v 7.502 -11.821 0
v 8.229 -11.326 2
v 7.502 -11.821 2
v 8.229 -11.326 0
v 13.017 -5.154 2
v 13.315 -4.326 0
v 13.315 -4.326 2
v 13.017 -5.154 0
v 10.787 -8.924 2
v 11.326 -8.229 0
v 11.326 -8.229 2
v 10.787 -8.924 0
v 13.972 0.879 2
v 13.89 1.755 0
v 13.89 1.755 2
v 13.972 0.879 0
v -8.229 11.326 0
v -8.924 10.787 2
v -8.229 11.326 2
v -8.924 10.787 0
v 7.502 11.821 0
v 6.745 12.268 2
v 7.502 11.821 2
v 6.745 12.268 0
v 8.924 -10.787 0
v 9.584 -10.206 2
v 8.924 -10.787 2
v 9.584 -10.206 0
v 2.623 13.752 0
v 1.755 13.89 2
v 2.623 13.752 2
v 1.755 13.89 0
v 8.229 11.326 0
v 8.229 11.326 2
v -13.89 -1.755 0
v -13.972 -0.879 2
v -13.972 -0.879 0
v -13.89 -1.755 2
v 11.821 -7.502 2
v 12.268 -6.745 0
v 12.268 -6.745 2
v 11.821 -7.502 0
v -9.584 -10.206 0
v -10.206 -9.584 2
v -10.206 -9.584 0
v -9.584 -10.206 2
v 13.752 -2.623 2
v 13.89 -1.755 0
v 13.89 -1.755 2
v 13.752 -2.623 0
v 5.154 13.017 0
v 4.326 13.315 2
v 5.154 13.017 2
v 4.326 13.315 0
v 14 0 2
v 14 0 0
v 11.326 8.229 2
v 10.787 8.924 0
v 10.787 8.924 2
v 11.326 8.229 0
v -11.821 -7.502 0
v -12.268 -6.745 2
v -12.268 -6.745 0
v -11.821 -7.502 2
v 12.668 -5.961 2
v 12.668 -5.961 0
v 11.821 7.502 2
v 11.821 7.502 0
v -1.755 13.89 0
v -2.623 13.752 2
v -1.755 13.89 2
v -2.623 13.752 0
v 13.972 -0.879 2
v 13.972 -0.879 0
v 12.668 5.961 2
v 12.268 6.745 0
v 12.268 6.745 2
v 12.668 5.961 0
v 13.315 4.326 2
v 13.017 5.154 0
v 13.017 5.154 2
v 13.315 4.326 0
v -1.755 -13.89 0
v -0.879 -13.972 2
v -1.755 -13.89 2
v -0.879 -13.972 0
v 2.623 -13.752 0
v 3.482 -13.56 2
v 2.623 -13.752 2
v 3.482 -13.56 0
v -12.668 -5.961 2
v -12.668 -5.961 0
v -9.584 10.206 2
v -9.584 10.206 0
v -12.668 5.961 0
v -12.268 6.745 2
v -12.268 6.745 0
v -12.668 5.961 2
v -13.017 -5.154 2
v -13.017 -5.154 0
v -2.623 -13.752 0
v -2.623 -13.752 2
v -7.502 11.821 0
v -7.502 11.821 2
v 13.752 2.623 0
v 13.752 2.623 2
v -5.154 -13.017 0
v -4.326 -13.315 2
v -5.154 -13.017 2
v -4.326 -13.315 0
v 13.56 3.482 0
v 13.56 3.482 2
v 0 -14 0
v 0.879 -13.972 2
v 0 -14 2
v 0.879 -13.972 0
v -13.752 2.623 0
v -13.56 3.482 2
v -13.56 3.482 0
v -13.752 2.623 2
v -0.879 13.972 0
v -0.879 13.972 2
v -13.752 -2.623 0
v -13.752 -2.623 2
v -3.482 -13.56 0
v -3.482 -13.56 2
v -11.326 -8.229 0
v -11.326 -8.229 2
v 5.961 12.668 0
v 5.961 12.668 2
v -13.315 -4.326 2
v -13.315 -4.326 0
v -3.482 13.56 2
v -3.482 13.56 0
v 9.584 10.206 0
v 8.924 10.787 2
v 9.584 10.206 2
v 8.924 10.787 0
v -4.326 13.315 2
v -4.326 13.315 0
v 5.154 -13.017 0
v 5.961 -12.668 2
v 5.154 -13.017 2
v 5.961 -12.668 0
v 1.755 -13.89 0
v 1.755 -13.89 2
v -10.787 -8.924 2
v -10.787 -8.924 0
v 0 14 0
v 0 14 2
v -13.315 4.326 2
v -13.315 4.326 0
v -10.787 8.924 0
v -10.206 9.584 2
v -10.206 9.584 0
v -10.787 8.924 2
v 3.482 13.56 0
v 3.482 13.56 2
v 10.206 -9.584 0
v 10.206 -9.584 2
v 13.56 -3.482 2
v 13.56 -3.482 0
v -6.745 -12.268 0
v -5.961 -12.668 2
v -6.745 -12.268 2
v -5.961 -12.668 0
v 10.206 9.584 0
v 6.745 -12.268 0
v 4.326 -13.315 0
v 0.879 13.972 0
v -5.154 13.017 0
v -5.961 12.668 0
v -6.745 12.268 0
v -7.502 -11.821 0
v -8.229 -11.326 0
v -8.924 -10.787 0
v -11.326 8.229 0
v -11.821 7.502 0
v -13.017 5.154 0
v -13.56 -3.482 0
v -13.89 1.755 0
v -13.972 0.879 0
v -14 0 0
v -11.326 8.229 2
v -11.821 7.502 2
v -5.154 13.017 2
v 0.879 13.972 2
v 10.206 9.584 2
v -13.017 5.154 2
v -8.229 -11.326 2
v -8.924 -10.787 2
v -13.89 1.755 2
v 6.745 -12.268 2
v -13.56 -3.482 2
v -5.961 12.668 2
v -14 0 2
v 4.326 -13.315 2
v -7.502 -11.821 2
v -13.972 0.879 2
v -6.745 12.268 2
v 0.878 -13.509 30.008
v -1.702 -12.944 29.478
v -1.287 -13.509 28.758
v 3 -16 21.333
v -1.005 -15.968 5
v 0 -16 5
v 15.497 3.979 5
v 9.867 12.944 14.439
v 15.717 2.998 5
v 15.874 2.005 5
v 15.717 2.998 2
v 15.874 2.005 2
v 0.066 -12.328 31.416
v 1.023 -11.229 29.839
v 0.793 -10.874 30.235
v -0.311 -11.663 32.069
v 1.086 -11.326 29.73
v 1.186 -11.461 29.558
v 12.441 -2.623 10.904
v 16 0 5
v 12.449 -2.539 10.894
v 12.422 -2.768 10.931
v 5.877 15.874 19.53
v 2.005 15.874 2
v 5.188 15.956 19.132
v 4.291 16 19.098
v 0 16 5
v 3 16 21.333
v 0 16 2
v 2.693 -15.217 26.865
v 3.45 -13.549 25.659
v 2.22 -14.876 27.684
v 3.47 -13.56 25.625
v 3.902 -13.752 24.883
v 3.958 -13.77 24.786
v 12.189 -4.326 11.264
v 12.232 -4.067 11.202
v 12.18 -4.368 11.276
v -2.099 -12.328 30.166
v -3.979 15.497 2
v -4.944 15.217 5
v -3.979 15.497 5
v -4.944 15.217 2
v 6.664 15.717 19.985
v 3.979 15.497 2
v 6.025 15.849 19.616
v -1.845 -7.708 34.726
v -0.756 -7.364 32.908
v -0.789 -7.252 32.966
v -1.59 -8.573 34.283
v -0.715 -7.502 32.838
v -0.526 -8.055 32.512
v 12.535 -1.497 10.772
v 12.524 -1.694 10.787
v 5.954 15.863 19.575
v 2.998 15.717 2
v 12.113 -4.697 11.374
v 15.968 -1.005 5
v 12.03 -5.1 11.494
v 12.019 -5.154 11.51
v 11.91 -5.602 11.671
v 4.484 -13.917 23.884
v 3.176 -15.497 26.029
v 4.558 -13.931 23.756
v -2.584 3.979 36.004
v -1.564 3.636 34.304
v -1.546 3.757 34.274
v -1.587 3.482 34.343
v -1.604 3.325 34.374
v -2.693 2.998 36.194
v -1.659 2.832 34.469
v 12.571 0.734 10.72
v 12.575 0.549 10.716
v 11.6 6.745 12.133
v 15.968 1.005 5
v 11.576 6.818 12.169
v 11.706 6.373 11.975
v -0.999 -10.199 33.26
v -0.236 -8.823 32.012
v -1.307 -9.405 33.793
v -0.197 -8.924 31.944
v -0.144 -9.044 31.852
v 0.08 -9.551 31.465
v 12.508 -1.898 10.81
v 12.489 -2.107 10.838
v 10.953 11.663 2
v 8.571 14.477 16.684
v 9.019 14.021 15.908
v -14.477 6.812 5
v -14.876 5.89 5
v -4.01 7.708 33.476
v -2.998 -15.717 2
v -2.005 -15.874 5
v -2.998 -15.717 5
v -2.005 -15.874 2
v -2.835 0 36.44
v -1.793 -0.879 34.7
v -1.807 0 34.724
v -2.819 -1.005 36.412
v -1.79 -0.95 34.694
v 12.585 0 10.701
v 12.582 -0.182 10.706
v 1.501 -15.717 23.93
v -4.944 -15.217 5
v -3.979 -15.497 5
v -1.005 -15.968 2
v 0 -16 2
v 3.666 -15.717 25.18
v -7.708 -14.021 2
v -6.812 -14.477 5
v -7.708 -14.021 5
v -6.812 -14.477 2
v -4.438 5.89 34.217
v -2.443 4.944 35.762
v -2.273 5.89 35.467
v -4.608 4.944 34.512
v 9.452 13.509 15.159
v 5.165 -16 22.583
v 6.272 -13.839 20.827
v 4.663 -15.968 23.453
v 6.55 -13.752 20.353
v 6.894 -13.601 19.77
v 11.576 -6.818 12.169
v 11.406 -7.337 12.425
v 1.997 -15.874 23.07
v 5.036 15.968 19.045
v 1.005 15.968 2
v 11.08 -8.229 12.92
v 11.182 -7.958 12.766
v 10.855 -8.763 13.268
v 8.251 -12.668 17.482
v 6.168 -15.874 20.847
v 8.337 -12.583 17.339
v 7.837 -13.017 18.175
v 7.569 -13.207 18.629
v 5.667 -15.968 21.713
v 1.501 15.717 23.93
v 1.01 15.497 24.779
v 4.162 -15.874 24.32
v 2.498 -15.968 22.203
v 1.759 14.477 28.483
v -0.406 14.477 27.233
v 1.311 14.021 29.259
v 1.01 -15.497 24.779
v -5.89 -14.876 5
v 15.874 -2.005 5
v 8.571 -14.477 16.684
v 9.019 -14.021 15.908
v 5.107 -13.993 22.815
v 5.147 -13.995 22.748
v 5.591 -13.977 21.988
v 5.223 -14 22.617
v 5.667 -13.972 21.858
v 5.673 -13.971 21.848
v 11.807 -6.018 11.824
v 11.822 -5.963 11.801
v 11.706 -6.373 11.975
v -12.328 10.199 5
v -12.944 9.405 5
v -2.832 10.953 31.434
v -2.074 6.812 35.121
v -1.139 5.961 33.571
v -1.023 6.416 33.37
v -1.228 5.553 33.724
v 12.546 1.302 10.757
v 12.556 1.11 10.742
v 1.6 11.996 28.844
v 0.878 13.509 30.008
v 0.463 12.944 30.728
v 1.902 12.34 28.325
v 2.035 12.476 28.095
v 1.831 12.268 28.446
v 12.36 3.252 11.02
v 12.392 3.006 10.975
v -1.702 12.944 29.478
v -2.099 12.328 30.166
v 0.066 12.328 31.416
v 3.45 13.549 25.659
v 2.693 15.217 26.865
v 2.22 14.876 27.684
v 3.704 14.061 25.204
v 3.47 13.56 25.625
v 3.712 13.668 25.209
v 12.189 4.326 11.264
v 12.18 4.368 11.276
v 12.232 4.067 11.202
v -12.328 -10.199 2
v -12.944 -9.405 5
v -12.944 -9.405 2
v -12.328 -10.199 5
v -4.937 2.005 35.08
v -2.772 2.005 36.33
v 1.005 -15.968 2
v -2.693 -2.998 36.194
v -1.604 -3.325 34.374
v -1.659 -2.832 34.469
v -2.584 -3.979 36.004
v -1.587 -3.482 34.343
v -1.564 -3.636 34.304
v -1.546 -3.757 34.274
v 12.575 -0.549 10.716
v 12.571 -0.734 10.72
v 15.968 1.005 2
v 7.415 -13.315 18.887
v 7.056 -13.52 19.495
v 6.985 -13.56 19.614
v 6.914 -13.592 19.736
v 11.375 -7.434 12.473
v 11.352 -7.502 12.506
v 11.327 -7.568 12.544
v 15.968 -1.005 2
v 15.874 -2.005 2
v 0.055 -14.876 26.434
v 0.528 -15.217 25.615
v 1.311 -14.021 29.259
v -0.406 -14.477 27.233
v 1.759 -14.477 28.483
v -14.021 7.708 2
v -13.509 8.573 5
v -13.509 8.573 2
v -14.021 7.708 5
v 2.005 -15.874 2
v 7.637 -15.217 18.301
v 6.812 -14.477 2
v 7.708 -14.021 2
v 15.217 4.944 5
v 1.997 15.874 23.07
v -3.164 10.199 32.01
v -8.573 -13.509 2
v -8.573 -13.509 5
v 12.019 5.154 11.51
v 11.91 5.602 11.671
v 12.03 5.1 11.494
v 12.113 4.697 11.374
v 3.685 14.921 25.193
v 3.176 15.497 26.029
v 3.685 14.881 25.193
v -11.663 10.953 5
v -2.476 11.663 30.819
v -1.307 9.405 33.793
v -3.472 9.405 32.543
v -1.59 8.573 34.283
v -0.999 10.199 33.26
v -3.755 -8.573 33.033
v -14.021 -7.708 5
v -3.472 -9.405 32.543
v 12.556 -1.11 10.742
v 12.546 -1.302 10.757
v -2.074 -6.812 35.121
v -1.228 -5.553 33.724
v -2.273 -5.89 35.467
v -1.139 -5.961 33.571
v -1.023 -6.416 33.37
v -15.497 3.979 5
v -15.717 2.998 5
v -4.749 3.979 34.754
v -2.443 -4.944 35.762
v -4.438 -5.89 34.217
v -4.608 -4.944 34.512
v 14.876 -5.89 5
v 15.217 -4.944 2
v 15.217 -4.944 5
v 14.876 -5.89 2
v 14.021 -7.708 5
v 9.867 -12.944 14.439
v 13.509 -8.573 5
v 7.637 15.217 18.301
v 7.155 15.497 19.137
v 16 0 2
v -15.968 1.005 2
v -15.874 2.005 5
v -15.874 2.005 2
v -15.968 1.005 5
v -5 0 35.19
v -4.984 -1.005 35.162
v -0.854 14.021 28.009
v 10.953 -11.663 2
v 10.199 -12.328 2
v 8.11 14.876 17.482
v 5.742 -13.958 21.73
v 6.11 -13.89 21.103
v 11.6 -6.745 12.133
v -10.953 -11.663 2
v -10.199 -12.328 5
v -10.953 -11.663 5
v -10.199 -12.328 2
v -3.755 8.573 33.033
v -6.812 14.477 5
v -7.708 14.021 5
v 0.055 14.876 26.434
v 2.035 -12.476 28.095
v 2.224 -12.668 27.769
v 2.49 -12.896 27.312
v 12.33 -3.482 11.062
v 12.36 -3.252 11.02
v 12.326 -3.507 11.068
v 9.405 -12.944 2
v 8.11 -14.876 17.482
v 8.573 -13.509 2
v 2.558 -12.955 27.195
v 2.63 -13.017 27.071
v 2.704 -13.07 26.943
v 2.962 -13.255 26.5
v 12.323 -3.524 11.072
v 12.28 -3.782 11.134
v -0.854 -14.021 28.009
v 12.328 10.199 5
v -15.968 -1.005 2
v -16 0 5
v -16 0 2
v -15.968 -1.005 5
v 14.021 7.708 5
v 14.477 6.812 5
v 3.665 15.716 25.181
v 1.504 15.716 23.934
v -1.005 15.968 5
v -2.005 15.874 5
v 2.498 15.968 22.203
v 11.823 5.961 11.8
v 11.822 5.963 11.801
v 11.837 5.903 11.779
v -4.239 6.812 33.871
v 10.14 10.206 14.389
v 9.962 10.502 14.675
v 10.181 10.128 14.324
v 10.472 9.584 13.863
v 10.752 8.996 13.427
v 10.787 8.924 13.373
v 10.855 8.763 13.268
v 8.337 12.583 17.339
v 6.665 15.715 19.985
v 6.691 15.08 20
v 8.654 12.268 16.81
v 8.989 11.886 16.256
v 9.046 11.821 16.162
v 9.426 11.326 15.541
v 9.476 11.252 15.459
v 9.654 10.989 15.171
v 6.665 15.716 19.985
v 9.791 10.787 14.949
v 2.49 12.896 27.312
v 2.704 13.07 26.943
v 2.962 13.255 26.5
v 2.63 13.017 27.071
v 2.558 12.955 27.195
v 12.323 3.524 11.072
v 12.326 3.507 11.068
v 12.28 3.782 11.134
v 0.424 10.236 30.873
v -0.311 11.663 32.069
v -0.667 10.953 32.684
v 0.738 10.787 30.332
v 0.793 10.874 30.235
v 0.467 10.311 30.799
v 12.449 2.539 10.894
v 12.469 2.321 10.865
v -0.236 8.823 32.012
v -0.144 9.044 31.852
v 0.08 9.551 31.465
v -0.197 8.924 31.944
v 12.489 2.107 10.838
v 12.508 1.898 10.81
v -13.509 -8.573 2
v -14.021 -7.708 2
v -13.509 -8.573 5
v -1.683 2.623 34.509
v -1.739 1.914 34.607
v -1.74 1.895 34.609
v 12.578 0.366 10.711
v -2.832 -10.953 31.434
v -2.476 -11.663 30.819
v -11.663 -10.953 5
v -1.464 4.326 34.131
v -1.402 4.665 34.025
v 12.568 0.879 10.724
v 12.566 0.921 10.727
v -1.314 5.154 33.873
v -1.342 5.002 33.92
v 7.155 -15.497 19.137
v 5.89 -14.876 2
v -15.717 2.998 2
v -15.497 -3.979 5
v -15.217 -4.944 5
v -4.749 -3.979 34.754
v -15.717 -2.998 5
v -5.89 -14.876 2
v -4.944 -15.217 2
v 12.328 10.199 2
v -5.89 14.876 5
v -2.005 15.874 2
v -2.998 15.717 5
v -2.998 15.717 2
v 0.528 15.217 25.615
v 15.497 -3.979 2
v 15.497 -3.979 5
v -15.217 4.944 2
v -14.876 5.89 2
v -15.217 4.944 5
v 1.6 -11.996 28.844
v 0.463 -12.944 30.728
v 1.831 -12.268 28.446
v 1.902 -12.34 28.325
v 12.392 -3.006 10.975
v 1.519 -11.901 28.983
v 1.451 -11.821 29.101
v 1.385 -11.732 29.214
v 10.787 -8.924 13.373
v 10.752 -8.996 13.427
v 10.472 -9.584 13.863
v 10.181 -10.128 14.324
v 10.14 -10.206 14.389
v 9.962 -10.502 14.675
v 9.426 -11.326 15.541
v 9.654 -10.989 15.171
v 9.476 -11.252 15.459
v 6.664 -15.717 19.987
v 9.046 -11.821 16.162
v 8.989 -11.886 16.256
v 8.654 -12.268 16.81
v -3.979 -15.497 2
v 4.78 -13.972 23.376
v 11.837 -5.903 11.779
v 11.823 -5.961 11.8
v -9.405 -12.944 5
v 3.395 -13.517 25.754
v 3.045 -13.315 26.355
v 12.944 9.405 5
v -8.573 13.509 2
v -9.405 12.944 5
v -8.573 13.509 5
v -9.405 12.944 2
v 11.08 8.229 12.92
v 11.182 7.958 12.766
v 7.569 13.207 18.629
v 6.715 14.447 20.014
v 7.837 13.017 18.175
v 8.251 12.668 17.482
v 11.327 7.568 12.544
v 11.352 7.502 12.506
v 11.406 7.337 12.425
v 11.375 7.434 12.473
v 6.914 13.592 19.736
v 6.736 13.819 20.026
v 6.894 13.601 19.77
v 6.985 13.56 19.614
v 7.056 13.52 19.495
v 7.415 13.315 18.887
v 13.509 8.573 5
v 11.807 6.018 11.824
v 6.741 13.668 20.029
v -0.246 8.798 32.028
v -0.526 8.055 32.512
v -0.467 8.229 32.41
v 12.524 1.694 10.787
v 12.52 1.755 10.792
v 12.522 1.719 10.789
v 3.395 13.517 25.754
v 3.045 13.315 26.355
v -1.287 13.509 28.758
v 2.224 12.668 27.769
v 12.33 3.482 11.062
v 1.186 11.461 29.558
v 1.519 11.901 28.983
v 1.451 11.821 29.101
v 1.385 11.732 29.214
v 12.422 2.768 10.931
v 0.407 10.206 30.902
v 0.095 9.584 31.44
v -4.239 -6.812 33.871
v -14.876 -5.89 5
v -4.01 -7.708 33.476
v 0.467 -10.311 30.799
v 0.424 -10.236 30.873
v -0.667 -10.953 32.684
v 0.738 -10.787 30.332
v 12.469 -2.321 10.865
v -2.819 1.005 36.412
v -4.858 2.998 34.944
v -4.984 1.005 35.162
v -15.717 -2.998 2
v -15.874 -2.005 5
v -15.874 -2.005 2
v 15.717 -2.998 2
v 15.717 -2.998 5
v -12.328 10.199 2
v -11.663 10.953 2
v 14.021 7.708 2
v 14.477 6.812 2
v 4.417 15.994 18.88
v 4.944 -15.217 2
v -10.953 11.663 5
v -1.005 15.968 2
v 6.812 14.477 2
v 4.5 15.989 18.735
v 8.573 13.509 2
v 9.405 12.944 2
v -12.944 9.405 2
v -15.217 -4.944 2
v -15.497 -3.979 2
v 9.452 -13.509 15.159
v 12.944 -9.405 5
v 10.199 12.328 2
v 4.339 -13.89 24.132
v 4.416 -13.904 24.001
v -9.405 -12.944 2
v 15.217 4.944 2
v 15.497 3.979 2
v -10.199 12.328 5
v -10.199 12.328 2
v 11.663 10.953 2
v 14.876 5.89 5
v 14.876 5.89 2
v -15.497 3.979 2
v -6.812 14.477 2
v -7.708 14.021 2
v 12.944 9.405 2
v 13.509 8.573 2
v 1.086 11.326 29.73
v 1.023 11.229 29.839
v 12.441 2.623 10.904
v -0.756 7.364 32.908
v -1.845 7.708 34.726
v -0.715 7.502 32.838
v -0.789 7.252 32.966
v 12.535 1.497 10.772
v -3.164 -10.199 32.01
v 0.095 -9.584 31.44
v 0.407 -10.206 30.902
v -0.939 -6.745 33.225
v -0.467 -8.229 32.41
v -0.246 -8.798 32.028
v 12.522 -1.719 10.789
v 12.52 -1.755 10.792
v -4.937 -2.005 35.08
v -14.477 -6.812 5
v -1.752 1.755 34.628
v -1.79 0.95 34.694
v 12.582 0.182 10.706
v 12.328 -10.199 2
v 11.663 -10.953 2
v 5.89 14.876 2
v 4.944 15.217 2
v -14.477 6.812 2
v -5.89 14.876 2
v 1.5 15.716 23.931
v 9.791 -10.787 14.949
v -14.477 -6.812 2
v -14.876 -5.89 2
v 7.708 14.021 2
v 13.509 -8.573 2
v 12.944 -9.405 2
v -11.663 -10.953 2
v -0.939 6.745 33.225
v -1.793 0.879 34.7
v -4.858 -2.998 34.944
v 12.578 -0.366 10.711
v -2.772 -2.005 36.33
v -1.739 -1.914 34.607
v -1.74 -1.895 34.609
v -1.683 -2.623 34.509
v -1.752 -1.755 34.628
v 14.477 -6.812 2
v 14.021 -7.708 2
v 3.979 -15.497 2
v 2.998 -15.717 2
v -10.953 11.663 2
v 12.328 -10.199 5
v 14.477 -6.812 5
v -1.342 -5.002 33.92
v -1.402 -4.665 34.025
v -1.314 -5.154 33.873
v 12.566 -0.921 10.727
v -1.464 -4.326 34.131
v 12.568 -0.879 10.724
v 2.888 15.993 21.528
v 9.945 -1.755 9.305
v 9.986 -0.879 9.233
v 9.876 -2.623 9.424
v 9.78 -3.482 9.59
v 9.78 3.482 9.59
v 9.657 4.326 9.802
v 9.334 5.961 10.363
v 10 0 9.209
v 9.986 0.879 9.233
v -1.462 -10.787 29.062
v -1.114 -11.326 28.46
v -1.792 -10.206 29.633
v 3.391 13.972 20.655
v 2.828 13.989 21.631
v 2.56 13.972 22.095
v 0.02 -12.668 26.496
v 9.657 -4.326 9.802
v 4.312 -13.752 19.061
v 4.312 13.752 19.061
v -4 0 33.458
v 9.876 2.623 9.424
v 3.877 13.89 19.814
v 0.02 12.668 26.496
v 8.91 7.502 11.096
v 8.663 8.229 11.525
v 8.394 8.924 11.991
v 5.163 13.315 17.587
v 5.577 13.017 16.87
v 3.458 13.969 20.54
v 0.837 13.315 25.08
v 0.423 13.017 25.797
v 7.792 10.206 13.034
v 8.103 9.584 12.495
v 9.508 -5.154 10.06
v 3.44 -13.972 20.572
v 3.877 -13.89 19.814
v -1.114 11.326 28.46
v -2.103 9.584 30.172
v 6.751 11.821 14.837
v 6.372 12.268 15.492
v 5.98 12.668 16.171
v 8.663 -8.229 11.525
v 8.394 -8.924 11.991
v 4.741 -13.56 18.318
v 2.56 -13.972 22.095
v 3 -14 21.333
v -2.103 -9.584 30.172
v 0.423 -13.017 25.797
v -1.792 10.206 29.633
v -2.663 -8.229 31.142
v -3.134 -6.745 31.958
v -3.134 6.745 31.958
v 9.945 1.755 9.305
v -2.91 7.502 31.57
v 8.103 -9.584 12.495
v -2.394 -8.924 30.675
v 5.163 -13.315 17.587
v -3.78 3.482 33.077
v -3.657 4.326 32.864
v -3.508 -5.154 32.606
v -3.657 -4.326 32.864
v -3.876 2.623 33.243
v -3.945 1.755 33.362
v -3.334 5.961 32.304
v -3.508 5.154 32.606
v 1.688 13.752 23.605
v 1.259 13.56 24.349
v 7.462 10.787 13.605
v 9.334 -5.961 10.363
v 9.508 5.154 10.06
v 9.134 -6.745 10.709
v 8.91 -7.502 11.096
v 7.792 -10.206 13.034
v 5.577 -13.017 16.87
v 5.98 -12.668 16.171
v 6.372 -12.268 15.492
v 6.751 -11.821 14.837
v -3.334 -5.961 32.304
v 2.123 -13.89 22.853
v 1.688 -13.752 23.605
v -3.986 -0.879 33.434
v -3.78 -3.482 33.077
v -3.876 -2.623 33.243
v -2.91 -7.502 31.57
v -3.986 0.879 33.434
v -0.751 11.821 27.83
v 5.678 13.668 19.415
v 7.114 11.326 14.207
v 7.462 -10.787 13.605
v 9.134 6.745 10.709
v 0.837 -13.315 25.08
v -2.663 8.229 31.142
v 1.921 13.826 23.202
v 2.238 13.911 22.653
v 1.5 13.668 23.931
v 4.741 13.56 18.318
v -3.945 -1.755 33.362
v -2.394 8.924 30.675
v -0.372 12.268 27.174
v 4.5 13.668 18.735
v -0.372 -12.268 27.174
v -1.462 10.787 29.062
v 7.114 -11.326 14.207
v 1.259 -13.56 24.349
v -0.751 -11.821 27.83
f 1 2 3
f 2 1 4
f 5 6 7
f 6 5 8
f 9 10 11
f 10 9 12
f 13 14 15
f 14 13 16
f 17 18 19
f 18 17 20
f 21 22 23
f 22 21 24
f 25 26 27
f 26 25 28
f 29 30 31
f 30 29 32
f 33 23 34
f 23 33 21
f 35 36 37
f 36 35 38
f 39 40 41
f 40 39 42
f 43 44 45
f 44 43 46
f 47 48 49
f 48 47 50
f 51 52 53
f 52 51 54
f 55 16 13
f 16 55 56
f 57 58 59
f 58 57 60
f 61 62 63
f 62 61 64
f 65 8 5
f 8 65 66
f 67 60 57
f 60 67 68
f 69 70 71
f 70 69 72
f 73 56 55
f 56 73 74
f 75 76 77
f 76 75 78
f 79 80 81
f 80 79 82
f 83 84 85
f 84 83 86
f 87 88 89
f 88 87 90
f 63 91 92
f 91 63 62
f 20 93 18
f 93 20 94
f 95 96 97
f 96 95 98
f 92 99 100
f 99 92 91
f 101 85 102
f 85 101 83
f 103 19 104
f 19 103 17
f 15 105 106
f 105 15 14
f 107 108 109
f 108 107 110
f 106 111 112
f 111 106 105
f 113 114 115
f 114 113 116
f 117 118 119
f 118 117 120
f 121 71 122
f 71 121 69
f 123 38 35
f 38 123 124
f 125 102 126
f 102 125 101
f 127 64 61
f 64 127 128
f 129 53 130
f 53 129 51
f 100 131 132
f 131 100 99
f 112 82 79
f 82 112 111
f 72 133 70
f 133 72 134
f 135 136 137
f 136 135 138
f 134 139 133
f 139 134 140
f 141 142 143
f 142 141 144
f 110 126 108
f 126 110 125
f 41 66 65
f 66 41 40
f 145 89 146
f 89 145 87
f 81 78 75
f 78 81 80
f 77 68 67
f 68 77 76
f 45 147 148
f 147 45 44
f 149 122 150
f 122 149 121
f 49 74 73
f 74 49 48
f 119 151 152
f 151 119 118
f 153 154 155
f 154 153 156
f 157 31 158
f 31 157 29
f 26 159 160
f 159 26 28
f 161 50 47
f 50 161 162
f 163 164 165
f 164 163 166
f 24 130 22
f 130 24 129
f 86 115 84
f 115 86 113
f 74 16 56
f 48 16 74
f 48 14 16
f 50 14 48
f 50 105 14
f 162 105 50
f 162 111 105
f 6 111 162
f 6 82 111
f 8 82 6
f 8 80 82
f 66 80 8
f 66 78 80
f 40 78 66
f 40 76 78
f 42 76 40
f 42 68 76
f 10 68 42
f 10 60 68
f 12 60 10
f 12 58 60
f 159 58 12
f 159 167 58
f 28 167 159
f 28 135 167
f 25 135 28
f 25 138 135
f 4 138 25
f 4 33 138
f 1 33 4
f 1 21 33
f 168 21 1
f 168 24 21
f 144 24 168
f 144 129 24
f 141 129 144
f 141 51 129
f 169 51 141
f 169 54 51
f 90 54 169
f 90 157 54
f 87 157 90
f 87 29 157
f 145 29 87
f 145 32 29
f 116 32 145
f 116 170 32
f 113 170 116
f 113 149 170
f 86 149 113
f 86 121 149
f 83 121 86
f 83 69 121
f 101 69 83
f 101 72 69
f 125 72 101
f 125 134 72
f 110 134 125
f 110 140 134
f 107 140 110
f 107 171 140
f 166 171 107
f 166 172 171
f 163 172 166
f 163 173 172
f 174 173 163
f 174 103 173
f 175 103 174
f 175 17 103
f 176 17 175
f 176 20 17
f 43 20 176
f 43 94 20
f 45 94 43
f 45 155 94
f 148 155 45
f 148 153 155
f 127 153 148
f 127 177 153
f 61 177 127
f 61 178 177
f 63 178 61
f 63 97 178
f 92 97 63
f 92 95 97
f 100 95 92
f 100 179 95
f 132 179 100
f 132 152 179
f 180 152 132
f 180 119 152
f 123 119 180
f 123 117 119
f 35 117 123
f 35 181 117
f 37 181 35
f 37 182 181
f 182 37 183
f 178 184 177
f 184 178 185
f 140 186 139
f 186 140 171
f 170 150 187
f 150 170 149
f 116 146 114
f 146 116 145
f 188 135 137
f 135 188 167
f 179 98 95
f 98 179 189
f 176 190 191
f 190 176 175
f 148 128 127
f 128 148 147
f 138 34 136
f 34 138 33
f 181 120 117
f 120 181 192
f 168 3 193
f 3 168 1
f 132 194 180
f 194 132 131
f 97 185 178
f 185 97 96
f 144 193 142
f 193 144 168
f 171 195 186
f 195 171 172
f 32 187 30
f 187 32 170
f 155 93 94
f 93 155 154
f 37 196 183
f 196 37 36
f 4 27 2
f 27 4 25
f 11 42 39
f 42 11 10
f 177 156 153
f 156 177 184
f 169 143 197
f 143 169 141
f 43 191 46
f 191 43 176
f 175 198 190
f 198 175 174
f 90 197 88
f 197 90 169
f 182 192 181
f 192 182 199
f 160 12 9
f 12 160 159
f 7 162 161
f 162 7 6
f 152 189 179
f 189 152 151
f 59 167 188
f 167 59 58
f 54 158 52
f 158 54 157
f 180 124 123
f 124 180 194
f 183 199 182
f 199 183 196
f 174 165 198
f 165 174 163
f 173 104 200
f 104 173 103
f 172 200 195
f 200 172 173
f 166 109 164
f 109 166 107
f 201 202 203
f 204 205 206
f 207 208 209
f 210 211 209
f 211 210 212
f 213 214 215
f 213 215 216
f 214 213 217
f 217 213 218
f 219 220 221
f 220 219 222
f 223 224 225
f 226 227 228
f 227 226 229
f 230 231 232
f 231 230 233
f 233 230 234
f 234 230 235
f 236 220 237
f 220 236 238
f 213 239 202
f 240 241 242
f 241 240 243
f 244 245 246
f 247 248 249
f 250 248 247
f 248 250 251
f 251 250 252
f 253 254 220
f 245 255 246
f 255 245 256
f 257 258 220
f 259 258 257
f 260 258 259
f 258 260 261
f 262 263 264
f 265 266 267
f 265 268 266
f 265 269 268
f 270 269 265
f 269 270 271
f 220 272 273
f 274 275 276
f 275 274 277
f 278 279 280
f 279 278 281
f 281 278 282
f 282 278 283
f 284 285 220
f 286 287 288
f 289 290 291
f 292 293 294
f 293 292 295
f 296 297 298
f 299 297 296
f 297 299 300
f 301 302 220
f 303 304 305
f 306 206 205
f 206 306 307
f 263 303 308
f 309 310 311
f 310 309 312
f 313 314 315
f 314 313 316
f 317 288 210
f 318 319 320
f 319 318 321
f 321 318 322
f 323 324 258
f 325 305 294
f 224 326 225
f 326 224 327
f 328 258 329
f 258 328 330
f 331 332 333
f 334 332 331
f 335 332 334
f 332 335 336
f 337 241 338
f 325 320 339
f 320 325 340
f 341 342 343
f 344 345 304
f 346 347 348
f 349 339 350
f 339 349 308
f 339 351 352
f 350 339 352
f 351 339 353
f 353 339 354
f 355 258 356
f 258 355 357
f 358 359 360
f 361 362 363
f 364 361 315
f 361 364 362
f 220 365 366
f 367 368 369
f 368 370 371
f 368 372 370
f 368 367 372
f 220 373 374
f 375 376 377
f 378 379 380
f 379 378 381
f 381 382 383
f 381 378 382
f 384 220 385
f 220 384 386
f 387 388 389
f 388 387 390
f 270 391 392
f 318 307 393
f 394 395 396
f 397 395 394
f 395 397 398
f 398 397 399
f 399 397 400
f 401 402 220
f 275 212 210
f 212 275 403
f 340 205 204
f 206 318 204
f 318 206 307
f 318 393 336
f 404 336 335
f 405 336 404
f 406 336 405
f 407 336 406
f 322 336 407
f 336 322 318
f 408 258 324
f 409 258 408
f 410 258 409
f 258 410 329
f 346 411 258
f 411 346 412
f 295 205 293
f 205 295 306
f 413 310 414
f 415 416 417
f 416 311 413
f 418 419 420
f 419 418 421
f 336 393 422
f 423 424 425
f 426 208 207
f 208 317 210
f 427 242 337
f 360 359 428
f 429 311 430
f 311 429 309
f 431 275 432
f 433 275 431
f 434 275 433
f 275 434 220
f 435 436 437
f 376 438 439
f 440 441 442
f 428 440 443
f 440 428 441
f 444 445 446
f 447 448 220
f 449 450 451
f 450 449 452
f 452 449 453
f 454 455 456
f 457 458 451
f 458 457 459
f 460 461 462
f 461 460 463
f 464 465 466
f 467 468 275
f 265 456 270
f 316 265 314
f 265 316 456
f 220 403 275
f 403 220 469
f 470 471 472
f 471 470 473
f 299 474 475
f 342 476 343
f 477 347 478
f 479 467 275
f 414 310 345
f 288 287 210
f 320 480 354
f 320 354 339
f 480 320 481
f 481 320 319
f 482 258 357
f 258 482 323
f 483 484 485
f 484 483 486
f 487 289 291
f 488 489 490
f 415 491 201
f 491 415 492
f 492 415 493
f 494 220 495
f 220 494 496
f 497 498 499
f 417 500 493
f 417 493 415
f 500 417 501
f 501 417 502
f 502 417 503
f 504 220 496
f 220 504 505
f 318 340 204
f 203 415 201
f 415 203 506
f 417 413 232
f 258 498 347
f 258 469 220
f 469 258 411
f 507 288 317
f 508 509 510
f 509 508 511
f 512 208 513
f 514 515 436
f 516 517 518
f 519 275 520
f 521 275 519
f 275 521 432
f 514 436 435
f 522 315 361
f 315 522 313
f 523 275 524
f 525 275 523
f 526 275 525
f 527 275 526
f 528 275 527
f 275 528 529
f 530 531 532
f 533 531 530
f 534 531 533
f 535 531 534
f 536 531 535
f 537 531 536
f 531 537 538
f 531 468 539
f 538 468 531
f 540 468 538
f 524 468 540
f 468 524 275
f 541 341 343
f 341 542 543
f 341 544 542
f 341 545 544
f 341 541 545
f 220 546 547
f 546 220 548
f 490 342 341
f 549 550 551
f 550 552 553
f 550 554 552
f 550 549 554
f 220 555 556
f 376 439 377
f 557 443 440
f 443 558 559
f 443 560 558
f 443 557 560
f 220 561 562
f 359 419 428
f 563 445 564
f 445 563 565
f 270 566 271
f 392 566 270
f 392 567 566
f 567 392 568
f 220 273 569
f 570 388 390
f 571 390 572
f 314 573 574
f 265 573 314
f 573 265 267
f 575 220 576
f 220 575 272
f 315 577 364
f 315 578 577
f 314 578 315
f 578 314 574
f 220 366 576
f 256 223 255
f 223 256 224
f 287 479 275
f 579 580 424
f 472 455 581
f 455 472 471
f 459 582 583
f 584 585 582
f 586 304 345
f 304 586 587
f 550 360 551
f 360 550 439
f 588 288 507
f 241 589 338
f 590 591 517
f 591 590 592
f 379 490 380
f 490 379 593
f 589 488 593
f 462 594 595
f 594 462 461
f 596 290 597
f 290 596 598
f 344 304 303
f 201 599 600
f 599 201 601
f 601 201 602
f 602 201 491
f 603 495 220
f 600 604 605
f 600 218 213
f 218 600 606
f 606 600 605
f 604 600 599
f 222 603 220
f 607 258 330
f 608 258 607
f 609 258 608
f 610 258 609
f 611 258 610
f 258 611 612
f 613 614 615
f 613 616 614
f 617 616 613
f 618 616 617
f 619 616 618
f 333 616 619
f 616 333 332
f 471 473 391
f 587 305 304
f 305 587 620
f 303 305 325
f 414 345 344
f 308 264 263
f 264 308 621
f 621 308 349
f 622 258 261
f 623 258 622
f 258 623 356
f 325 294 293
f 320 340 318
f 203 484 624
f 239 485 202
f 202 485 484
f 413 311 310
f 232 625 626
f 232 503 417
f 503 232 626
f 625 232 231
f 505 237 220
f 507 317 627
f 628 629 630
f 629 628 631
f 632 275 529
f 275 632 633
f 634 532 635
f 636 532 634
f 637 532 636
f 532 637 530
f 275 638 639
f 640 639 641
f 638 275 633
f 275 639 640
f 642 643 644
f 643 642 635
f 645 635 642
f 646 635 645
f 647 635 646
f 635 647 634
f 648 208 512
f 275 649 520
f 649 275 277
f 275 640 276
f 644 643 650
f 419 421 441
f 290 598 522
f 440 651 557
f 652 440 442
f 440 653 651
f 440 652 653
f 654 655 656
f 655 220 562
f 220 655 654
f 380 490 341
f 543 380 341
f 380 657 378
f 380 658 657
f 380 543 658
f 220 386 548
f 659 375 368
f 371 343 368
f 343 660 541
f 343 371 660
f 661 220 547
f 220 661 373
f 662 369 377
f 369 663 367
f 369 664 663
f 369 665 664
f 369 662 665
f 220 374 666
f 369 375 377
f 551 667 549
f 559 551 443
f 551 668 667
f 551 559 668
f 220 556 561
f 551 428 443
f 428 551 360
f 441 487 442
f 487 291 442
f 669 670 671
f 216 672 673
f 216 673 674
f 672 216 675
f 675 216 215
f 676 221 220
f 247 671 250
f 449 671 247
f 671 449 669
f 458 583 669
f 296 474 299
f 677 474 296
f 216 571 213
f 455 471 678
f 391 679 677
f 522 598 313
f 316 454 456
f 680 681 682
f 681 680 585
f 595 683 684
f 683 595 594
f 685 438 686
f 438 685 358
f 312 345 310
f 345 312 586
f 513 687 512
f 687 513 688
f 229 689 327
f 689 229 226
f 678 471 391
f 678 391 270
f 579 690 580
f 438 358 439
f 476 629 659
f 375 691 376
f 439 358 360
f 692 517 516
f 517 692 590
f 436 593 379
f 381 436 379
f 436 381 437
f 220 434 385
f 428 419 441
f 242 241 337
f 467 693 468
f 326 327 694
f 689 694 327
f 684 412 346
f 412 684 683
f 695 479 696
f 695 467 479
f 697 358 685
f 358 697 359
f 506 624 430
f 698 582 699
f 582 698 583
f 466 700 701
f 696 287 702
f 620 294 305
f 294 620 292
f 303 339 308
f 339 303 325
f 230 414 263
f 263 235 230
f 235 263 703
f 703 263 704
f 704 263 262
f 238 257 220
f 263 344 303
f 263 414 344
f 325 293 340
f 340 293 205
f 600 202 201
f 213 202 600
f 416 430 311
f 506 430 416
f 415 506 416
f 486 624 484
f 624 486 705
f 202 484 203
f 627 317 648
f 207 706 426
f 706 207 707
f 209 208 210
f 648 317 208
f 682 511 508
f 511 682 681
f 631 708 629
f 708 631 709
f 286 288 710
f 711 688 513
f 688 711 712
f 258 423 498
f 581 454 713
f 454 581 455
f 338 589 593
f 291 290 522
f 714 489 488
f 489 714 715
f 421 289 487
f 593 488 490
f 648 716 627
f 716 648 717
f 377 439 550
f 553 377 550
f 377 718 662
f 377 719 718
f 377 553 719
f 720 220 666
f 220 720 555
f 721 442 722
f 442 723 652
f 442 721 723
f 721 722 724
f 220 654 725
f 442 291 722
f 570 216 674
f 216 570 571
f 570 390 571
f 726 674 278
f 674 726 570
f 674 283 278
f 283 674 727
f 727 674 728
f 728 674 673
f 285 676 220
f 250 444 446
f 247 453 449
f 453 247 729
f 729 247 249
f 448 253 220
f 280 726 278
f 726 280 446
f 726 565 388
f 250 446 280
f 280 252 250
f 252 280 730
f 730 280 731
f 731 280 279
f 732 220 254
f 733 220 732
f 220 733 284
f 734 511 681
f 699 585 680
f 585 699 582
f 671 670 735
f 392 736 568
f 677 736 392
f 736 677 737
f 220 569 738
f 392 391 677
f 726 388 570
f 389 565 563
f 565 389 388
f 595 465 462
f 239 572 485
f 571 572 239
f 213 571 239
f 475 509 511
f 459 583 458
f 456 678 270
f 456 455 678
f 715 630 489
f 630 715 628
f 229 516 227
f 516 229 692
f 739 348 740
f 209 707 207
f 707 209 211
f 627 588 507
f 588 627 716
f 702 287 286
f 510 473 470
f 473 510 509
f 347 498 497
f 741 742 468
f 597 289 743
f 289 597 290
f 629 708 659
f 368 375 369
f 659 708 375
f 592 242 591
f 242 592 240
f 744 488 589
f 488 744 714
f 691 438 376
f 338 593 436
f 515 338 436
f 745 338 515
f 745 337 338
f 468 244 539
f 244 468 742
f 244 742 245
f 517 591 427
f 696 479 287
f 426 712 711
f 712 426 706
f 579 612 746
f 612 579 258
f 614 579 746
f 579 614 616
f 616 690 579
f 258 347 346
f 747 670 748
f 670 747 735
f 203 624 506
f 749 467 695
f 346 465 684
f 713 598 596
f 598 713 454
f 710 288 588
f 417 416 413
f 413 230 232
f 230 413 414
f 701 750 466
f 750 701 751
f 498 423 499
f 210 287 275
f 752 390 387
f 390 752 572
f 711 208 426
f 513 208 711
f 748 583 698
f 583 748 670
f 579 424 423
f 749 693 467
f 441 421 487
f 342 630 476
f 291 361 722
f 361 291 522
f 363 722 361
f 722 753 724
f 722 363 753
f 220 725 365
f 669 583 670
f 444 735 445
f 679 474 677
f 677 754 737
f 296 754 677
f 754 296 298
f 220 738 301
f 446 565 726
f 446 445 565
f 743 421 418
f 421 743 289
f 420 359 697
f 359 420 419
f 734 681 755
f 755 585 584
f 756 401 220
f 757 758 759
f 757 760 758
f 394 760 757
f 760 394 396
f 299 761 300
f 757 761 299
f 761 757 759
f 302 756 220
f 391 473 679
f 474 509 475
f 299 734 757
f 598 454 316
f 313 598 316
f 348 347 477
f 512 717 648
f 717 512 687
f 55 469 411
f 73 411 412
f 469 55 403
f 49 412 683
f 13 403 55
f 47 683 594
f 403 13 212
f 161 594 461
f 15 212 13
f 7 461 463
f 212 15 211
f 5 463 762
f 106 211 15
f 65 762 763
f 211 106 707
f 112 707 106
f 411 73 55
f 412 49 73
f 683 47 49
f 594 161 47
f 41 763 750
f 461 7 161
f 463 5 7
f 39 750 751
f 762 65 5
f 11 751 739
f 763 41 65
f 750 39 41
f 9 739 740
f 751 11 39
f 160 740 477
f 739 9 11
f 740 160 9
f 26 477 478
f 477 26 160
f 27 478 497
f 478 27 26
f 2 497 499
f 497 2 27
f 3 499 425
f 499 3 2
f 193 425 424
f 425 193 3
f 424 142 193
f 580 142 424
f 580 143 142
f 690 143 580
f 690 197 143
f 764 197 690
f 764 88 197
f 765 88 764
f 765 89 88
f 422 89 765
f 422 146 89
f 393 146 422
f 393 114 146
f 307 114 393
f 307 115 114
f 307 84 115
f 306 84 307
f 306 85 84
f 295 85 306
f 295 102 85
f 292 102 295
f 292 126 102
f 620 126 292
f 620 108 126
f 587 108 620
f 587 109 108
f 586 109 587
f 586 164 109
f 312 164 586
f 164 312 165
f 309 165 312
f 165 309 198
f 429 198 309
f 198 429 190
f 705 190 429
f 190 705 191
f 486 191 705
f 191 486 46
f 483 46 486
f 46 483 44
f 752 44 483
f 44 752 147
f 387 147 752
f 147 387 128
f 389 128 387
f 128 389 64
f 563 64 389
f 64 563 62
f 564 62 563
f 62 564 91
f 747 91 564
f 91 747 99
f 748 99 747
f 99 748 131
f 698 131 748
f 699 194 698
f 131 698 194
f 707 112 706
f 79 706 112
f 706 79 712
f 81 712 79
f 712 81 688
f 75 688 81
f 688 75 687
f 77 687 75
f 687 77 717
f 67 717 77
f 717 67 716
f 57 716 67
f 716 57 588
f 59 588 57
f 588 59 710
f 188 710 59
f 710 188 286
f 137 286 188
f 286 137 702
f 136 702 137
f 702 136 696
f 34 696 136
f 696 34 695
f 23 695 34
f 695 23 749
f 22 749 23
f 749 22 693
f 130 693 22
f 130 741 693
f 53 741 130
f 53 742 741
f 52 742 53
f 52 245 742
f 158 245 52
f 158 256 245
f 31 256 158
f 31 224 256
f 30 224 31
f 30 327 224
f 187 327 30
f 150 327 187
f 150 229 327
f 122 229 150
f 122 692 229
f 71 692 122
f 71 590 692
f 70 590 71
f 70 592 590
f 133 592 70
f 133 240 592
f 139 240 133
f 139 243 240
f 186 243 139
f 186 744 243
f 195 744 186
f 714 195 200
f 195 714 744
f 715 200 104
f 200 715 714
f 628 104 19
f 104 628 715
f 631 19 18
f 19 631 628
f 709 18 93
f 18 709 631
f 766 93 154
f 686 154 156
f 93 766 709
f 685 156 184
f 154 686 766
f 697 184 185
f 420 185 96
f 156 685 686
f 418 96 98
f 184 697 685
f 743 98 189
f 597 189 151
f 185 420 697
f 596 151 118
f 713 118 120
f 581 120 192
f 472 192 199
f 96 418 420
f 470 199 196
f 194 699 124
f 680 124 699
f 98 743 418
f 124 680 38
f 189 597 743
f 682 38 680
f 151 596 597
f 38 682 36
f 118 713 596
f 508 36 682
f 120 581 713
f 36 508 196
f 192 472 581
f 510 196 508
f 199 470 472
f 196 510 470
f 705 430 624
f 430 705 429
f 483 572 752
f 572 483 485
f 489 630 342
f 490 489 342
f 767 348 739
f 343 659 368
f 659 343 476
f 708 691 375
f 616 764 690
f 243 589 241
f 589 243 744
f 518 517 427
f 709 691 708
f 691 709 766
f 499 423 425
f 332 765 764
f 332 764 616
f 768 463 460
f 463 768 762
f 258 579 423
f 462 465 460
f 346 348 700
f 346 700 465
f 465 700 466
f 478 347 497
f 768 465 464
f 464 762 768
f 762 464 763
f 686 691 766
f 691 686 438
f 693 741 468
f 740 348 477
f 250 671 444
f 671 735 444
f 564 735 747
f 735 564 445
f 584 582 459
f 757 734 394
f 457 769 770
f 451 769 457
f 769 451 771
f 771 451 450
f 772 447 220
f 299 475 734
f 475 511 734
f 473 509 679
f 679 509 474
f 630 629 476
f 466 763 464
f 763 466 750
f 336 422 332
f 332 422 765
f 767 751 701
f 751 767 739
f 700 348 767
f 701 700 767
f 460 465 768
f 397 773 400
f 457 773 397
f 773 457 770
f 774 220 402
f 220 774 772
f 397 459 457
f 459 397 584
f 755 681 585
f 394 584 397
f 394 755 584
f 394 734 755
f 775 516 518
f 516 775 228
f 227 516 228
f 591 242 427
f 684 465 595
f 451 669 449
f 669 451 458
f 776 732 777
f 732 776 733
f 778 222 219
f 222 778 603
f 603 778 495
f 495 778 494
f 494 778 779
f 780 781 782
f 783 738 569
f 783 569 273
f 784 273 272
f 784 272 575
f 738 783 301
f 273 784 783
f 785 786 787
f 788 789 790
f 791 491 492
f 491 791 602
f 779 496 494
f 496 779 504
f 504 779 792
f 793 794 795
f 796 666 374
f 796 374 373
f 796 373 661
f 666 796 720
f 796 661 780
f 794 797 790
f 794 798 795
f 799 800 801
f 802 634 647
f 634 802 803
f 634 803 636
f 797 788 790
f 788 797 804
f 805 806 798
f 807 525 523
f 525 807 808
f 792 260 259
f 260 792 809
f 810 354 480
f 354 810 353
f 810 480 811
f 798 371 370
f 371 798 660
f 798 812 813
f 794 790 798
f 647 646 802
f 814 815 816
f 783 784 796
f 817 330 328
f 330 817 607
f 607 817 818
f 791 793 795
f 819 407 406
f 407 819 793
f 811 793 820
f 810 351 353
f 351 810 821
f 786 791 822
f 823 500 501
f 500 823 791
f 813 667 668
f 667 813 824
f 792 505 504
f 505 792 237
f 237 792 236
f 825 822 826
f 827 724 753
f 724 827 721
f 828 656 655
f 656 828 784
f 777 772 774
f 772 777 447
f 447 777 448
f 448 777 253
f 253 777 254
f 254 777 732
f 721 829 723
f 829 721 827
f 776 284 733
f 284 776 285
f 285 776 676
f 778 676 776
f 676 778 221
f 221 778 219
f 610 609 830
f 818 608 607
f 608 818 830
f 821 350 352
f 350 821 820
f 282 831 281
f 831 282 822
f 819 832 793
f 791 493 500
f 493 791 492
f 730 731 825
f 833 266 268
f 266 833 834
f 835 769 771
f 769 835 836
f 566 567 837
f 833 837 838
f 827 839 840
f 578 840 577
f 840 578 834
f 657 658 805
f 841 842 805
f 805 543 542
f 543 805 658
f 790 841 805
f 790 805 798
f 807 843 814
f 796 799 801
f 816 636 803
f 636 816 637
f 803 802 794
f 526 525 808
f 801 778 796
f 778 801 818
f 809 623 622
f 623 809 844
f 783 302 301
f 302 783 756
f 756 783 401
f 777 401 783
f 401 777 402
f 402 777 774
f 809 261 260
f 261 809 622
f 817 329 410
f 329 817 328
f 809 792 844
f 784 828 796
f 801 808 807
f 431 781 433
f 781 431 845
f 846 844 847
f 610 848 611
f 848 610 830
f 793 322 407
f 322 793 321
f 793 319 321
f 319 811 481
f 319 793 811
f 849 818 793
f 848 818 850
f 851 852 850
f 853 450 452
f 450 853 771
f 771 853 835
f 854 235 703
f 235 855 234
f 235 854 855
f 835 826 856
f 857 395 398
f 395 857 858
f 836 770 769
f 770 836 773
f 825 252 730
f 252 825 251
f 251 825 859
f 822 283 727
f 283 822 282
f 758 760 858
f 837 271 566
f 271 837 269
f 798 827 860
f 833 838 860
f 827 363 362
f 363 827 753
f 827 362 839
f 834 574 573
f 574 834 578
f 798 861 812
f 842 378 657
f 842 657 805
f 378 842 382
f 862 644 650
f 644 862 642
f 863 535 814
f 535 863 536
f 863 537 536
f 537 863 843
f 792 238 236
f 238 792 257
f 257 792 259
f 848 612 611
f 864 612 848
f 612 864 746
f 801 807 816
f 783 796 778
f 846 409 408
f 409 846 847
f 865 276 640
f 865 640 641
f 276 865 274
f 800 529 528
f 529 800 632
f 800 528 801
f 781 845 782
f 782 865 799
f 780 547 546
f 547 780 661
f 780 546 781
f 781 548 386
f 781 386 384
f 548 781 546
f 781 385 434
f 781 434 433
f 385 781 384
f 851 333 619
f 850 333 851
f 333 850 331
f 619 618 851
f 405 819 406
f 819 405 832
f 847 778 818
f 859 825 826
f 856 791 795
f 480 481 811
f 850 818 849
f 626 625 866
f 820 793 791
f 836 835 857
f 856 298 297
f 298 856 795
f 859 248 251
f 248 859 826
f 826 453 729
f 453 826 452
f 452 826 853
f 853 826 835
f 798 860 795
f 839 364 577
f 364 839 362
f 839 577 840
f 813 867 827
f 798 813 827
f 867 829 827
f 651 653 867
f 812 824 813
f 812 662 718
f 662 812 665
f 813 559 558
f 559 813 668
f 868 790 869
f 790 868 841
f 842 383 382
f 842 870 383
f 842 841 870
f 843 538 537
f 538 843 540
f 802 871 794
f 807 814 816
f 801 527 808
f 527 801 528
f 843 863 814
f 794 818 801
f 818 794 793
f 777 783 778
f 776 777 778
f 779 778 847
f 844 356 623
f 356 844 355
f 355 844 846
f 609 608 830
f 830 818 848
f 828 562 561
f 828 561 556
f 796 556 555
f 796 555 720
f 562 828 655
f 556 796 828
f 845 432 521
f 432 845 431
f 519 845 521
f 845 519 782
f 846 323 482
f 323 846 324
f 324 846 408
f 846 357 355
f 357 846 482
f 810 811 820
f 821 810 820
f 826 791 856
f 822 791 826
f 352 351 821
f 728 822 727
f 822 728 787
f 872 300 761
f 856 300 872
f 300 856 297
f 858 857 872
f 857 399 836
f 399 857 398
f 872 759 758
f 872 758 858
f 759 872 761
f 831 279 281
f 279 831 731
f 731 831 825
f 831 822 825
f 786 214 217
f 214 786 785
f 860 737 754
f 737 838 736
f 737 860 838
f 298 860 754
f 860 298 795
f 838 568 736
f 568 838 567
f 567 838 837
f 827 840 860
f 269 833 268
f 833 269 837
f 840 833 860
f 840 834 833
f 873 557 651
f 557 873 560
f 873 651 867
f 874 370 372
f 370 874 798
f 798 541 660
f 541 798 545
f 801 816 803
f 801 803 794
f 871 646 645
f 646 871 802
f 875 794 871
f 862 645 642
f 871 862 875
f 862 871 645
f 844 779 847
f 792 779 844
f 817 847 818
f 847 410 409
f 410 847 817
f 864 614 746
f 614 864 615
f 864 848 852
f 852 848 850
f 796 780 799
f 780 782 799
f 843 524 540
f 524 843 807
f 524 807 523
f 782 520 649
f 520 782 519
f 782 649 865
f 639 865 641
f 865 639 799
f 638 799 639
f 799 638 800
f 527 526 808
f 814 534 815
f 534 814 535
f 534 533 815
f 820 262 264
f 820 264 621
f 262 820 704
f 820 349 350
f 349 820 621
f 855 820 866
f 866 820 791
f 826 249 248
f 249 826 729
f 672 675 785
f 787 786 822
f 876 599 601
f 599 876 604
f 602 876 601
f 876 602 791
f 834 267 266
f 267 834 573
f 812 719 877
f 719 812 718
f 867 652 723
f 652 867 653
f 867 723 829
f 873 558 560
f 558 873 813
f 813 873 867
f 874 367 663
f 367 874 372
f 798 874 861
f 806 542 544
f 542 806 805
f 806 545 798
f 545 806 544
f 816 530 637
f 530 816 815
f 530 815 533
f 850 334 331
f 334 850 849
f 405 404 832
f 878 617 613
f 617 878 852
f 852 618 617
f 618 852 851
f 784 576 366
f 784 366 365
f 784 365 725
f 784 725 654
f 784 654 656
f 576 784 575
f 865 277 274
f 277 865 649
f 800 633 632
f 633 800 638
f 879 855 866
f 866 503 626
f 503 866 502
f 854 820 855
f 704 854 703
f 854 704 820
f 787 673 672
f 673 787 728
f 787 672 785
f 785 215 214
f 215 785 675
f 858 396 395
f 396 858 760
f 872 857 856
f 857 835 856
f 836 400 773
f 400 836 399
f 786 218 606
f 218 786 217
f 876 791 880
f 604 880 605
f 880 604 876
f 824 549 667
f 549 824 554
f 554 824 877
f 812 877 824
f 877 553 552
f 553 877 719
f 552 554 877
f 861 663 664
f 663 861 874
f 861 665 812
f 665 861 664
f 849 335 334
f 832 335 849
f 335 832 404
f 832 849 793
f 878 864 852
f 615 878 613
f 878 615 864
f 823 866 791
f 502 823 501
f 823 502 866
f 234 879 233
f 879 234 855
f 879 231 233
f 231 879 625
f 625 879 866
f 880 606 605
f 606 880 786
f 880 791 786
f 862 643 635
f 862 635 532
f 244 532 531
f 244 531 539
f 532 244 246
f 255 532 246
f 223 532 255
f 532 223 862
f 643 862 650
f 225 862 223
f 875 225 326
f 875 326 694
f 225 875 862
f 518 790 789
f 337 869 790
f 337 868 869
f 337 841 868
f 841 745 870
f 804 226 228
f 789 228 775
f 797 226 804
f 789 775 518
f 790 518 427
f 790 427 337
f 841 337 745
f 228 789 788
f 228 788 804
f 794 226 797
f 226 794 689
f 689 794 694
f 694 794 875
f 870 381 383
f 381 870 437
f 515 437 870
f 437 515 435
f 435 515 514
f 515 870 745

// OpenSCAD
$fn = 100;

wedge(60);  // between 10 and 60

module wedge(angle){
difference(){
union(){
cylinder(d=28,h=3);
hull(){
translate([0,0,2])cylinder(d=32,h=3);
translate([angle/20,0,8+(angle-20)/3])rotate([0,angle,0])cylinder(d=32,h=2.5);
}
}
translate([angle/20,0,8+(angle-20)/3])rotate([0,angle,0])cylinder(d=28,h=3.1);
translate([angle/20,0,8+(angle-20)/3])rotate([0,angle,0])translate([-3,10,0])cube([6,30,5]);
}
}


diameter = 18;
//translate([0,0,5])top();
//translate([0,0,2])holder();
//translate([0,0,-10])beugel(20);
//cup(0,0);
module ring(){
  difference() {
        union(){
            translate([0,0,2])cylinder(d = 32, h = 2);
            cheese(15,1,2);
        }
         translate([0, 0, 2])cylinder(d = 28.8, h = 10);
            translate([-3, 11.5, -2])cube([6, 5, 10]);
        
        }
         

         translate([-3,0,-11])rotate([90,0,90])doughnut(11,1.5,6);
    }      

module top() {
    difference(){
        union(){
            rotate_extrude() {
                hull() {
                    translate([15, 17.5, 0]) circle(r = 1);
                    translate([10, 18, 0]) circle(r = 0.5);
                }
                hull() {
                    translate([15, 17.5, 0]) circle(r = 1);
                    translate([15, 0, 0]) circle(r = 1);
                }     
            } 
               translate([0,0,8])  hull(){
rotate([0,0,-5])translate([0,-14,-2])sphere(d=12);
rotate([0,0,40])translate([0,-14,-2])sphere(d=12);
      
rotate([0,0,-5])translate([0,-14,-12])rotate([17,0,0])translate([0,0,15])cylinder(d1=22,d2=22,h=4);
rotate([0,0,40])translate([0,-14,-12])rotate([17,0,0])translate([0,0,15])cylinder(d1=22,d2=22,h=4);      
      }
        }
        translate([-20,-20,-5])cube([40,40,5]);
        cylinder(d=28,h=17.5);
        
        translate([0,0,8]){
              rotate([0,0,-5])translate([-6.5,-26.5,2])rotate([17,0,0])cube([13,12,5]);
  rotate([0,0,40])translate([-6.5,-26.5,2])rotate([17,0,0])cube([13,12,5]);
         
                       rotate([0,0,-5])translate([-6.5,-24,1])rotate([17,0,0])cube([13,7.5,5]);
            
  rotate([0,0,40])translate([-6.5,-24,1])rotate([17,0,0])cube([13,7.5,5]);   
            
            
  rotate([0,0,-5])translate([-3,-22,-4])cube([6,22,10]);
  rotate([0,0,40])translate([-3,-22,-4])cube([6,22,10]);
        }
      cylinder(d=28.4,h=4.5);//better fit  
      translate([-20,-20,0])cube([40,40,1.2]);  
    }

}

module holder(){
difference() {
    union(){
    translate([0,0,-3])cylinder(d = 32, h = 1);
    translate([0,0,-5])cylinder(d=28,h=5);  
  }
  translate([-20, 0, -15])rotate([-10, 0, 0])
  union() {
    rotate([0, 90, 0])cylinder(d = 20, h = 40);
    translate([0, -10, -60])cube([40, 20, 60]);
  }
  translate([-7,-7,-4])potmeters();
  translate([0,0,1])cylinder(d=26,h=2);
//   rotate([0,0,-5])translate([-3,-22,-3])cube([6,22,10]);
//  rotate([0,0,40])translate([-3,-22,-3])cube([6,22,10]);
  //translate([0,-20,-50])rotate([-10,0,0])cylinder(d=5,h=70);
  translate([-3,11.5,-5])cube([6,2.5,10]); 
 translate([-3,-12,-4])cube([6,24,10]); 
}
}
//beugel(20);
module beugel(angle) {
    
  difference() {
    union() {

      hull() {
        cylinder(d = 32, h = 2);
        translate([0, -15, -22])rotate([90-angle, 0, 0])cheese(r1 = 10 - 2.5, r2 = 3, h = 4);
                  translate([0, 8, -22])rotate([90-angle, 0, 0])cheese(r1 = 10 - 2.5, r2 = 3, h = 4);
      }
     rotate([-angle, 0, 0])translate([-4,3,-32])rotate([0,90,0])doughnut(diameter/2+2,2,8);
    }

    
    translate([0, 0, -13])rotate([-angle, 0, 0])
    fingercutout(45,20);
    
    translate([0, 0, -0.3])cylinder(d = 28.8, h = 10);
    translate([-3, 11.5, -2])cube([6, 5, 10]);
  }
}


module handle(angle) {
    
  difference() {
    union() {

      hull() {
        cylinder(d = 32, h = 2);
        translate([0, -15, -22])rotate([90-angle, 0, 0])cheese(r1 = 10 - 2.5, r2 = 3, h = 4);
                  translate([0, 8, -22])rotate([90-angle, 0, 0])cheese(r1 = 10 - 2.5, r2 = 3, h = 4);
      }

    }

    
    translate([0, 0, -13])rotate([-angle, 0, 0])
    fingercutout(45,20);
    
    translate([0, 0, 0])cylinder(d = 28.8, h = 10);
    translate([-3, 11.5, -2])cube([6, 2.5, 10]);
    translate([-3, 11.5, -2])cube([6, 5, 10]);
  }
}



module fingercutout(angle,height){
    
    translate([0,0,-height])cylinder(d=diameter,h=height);
    translate([0,0,0])sphere(d=diameter);
    translate([0,0,-height])sphere(d=diameter);
    rotate([0,0,angle/2])translate([-40,0,0])
    union() {
      rotate([0, 90, 0])cylinder(d = diameter, h = 40);
       translate([0,0,-height])rotate([0, 90, 0])cylinder(d = diameter, h = 40);
       translate([0,-diameter/2,-height])cube([40,diameter,height]); 
    }

    rotate([0,0,-angle/2])translate([0,0,0])
        union() {
      rotate([0, 90, 0])cylinder(d = diameter, h = 40);
      translate([0,0,-height])rotate([0, 90, 0])cylinder(d = diameter, h = 40);
                  translate([0,-diameter/2,-height])cube([40,diameter,height]);
    }
}    

module originalhandle() {
  difference() {
    union() {

      hull() {
        cylinder(d = 32, h = 2);
        translate([0, -15, -35])rotate([80, 0, 0])cheese(r1 = 10 - 2.5, r2 = 3, h = 4);
      }

    }
    translate([0, 0, 0])cylinder(d = 28.8, h = 10);
    translate([-20, 0, -11])rotate([-10, 0, 0])

    union() {
      rotate([0, 90, 0])cylinder(d = 20, h = 40);
      translate([0, -10, -60])cube([40, 20, 60]);
    }
    translate([-3, 11.5, -5])cube([6, 2.5, 10]);
  }
}

//translate([-40,0,0])cylinder(d=24,h=8);
module cup(x,y){translate([0, 0, 5])rotate([x,y, 0]) {
  translate([0, 0, 5]) {
    translate([0, 0, 14]) {
      difference() {
        cheese(6.5, 2.5, 0);
        translate([0, 0, 26])sphere(d = 50);
      }
    }
    translate([0, 0, 5])cylinder(d = 9, h = 8);
    translate([0, 0, -7])difference() {
      sphere(d = 28);
      translate([-15, -15, -15])cube([30, 30, 22]);
    }
  }
}
}



module potmeters(){
translate([-3,2,0])cube([23,10,14]);

translate([2,1,0])cube([10,16,14]);

cube([14,14,14]);

}




module doughnut(r1, r2, h) {
  rotate_extrude() {
    hull() {
      translate([r1, h, 0])circle(r = r2);
      translate([r1, 0, 0])circle(r = r2);
    }
  }
}

module cheese(r1, r2, h) {
  hull() {
    rotate_extrude() {
      translate([r1, h, 0])circle(r = r2);
      translate([r1, 0, 0])circle(r = r2);
    }
  }
}
